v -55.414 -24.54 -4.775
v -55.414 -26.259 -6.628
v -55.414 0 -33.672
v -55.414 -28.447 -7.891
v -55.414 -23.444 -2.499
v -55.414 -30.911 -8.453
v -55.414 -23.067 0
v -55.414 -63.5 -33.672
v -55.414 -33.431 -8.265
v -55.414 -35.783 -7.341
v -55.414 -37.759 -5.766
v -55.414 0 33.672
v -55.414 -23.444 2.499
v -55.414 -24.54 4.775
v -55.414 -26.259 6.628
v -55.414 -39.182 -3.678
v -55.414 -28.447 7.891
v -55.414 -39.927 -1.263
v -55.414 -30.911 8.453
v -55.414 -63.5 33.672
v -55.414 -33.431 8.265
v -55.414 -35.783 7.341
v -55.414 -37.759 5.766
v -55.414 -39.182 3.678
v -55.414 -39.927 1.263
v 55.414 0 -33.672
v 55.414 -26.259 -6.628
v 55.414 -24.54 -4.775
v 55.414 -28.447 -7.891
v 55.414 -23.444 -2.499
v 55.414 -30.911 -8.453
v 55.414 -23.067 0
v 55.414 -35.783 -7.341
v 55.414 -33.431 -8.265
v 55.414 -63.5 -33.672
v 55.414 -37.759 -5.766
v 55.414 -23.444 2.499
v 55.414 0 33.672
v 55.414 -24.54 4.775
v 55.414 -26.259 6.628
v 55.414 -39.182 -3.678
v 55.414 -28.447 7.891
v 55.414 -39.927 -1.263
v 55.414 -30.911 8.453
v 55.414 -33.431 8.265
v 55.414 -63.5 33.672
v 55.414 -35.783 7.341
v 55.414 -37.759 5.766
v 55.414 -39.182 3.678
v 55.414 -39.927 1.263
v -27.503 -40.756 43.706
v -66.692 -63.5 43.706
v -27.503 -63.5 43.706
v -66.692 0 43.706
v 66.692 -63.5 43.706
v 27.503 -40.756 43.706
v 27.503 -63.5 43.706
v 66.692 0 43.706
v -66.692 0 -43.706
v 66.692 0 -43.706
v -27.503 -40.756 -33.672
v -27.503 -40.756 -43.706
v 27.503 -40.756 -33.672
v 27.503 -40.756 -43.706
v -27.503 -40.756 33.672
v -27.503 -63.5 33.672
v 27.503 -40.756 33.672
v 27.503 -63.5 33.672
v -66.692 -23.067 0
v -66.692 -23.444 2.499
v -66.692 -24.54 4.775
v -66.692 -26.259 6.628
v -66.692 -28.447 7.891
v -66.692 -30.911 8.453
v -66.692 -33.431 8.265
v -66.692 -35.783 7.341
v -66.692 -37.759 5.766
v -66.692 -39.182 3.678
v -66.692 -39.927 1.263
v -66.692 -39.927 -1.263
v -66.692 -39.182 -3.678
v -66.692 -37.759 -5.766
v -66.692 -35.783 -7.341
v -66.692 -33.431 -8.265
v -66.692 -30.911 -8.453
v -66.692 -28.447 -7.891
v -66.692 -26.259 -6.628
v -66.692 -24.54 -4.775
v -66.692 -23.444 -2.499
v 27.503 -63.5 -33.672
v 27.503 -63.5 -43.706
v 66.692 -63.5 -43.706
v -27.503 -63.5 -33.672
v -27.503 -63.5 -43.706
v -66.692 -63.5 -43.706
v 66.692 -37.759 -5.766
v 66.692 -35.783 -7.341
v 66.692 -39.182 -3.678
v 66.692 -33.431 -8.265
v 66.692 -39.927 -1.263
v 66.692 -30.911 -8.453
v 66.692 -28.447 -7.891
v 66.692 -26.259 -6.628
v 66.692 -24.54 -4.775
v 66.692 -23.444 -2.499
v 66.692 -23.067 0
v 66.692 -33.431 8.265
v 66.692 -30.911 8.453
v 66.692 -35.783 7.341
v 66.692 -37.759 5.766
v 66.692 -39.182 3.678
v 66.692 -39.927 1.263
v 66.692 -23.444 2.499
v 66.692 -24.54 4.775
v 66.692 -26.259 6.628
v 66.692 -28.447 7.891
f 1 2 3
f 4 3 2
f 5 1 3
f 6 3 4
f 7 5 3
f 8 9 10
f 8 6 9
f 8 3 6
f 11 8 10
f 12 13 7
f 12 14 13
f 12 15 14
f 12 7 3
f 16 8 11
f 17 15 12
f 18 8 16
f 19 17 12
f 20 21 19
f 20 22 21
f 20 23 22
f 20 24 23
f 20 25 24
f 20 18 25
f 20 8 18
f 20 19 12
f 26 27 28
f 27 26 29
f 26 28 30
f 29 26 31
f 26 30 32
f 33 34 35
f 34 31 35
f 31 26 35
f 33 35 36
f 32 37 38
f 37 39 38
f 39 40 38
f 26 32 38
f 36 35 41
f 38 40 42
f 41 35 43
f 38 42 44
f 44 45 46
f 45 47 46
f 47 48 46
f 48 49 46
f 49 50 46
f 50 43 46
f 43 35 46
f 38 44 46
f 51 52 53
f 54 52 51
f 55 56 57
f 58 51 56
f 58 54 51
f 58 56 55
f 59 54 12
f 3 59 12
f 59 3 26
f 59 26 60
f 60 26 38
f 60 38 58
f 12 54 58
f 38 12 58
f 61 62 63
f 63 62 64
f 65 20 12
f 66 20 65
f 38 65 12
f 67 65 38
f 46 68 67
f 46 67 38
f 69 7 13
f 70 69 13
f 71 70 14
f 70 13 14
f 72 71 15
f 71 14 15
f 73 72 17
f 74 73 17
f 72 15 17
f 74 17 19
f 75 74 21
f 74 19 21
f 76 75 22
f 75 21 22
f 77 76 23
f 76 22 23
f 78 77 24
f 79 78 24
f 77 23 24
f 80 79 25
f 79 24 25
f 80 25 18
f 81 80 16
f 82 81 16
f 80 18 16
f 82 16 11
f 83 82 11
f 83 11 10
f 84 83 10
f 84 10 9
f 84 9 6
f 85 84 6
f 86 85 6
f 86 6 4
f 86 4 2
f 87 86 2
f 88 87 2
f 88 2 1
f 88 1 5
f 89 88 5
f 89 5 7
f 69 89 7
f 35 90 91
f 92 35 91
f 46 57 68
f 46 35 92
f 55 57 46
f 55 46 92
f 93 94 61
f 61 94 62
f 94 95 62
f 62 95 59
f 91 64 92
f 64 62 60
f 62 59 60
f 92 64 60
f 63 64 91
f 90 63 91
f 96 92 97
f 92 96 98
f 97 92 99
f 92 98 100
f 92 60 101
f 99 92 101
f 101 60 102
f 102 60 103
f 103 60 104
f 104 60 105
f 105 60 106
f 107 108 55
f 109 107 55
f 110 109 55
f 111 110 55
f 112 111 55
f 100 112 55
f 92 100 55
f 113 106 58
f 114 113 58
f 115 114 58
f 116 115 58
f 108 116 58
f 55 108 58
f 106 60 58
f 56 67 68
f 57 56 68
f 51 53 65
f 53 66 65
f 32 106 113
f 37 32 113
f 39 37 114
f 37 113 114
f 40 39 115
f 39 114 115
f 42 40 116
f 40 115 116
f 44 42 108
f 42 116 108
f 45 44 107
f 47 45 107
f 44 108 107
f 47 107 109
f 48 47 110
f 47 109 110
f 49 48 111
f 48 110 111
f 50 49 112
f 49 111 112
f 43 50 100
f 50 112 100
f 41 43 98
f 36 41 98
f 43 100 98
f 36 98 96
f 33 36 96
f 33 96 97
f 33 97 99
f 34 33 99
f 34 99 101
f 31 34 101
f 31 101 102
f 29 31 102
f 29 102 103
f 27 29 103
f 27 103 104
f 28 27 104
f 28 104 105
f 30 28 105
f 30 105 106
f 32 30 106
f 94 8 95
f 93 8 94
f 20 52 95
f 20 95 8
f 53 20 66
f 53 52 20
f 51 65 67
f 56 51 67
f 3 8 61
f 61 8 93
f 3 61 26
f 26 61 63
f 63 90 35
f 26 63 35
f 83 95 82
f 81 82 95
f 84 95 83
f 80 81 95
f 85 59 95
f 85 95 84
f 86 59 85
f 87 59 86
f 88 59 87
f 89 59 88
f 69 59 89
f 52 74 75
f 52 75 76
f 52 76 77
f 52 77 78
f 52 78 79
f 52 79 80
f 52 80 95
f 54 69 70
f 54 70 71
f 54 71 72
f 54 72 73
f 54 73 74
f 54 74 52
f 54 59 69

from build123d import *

# Parameters (mm, degrees)
F0_W     = 133.384466
F0_H     = 87.411344
F1_DEPTH = 63.5
F4_W     = 110.828802
F4_H     = 67.344964
F5_DEPTH = 63.501
F6_W     = 55.005372
F6_H     = 22.744318
F2_DEPTH = 87.412344
F3_R     = 8.477147
F7_DEPTH = 133.385466


with BuildPart() as f1:
    # F0 (on Front) → F1 (new body)
    with BuildSketch(Plane.XZ):
        Rectangle(F0_W, F0_H)
    extrude(amount=F1_DEPTH)

    # F4 (on face) → F5 (cut, through all)
    with BuildSketch(Plane.XZ.offset(63.5)):
        Rectangle(F4_W, F4_H)
    extrude(amount=-F5_DEPTH, mode=Mode.SUBTRACT)

    # F6 (on face) → F2 (cut, through all)
    with BuildSketch(Plane(origin=(0, 0, -43.705672), x_dir=(1, 0, 0), z_dir=(0, 0, -1))):
        with Locations((0, 74.872159)):
            Rectangle(F6_W, F6_H)
        with Locations((0, 52.127841)):
            Rectangle(F6_W, F6_H)
    extrude(amount=-F2_DEPTH, mode=Mode.SUBTRACT)

    # F3 (on face) → F7 (cut, through all)
    with BuildSketch(Plane.YZ.offset(66.692233)):
        with Locations((-31.544417, 0)):
            Circle(F3_R)
    extrude(amount=-F7_DEPTH, mode=Mode.SUBTRACT)


solid = f1.part
